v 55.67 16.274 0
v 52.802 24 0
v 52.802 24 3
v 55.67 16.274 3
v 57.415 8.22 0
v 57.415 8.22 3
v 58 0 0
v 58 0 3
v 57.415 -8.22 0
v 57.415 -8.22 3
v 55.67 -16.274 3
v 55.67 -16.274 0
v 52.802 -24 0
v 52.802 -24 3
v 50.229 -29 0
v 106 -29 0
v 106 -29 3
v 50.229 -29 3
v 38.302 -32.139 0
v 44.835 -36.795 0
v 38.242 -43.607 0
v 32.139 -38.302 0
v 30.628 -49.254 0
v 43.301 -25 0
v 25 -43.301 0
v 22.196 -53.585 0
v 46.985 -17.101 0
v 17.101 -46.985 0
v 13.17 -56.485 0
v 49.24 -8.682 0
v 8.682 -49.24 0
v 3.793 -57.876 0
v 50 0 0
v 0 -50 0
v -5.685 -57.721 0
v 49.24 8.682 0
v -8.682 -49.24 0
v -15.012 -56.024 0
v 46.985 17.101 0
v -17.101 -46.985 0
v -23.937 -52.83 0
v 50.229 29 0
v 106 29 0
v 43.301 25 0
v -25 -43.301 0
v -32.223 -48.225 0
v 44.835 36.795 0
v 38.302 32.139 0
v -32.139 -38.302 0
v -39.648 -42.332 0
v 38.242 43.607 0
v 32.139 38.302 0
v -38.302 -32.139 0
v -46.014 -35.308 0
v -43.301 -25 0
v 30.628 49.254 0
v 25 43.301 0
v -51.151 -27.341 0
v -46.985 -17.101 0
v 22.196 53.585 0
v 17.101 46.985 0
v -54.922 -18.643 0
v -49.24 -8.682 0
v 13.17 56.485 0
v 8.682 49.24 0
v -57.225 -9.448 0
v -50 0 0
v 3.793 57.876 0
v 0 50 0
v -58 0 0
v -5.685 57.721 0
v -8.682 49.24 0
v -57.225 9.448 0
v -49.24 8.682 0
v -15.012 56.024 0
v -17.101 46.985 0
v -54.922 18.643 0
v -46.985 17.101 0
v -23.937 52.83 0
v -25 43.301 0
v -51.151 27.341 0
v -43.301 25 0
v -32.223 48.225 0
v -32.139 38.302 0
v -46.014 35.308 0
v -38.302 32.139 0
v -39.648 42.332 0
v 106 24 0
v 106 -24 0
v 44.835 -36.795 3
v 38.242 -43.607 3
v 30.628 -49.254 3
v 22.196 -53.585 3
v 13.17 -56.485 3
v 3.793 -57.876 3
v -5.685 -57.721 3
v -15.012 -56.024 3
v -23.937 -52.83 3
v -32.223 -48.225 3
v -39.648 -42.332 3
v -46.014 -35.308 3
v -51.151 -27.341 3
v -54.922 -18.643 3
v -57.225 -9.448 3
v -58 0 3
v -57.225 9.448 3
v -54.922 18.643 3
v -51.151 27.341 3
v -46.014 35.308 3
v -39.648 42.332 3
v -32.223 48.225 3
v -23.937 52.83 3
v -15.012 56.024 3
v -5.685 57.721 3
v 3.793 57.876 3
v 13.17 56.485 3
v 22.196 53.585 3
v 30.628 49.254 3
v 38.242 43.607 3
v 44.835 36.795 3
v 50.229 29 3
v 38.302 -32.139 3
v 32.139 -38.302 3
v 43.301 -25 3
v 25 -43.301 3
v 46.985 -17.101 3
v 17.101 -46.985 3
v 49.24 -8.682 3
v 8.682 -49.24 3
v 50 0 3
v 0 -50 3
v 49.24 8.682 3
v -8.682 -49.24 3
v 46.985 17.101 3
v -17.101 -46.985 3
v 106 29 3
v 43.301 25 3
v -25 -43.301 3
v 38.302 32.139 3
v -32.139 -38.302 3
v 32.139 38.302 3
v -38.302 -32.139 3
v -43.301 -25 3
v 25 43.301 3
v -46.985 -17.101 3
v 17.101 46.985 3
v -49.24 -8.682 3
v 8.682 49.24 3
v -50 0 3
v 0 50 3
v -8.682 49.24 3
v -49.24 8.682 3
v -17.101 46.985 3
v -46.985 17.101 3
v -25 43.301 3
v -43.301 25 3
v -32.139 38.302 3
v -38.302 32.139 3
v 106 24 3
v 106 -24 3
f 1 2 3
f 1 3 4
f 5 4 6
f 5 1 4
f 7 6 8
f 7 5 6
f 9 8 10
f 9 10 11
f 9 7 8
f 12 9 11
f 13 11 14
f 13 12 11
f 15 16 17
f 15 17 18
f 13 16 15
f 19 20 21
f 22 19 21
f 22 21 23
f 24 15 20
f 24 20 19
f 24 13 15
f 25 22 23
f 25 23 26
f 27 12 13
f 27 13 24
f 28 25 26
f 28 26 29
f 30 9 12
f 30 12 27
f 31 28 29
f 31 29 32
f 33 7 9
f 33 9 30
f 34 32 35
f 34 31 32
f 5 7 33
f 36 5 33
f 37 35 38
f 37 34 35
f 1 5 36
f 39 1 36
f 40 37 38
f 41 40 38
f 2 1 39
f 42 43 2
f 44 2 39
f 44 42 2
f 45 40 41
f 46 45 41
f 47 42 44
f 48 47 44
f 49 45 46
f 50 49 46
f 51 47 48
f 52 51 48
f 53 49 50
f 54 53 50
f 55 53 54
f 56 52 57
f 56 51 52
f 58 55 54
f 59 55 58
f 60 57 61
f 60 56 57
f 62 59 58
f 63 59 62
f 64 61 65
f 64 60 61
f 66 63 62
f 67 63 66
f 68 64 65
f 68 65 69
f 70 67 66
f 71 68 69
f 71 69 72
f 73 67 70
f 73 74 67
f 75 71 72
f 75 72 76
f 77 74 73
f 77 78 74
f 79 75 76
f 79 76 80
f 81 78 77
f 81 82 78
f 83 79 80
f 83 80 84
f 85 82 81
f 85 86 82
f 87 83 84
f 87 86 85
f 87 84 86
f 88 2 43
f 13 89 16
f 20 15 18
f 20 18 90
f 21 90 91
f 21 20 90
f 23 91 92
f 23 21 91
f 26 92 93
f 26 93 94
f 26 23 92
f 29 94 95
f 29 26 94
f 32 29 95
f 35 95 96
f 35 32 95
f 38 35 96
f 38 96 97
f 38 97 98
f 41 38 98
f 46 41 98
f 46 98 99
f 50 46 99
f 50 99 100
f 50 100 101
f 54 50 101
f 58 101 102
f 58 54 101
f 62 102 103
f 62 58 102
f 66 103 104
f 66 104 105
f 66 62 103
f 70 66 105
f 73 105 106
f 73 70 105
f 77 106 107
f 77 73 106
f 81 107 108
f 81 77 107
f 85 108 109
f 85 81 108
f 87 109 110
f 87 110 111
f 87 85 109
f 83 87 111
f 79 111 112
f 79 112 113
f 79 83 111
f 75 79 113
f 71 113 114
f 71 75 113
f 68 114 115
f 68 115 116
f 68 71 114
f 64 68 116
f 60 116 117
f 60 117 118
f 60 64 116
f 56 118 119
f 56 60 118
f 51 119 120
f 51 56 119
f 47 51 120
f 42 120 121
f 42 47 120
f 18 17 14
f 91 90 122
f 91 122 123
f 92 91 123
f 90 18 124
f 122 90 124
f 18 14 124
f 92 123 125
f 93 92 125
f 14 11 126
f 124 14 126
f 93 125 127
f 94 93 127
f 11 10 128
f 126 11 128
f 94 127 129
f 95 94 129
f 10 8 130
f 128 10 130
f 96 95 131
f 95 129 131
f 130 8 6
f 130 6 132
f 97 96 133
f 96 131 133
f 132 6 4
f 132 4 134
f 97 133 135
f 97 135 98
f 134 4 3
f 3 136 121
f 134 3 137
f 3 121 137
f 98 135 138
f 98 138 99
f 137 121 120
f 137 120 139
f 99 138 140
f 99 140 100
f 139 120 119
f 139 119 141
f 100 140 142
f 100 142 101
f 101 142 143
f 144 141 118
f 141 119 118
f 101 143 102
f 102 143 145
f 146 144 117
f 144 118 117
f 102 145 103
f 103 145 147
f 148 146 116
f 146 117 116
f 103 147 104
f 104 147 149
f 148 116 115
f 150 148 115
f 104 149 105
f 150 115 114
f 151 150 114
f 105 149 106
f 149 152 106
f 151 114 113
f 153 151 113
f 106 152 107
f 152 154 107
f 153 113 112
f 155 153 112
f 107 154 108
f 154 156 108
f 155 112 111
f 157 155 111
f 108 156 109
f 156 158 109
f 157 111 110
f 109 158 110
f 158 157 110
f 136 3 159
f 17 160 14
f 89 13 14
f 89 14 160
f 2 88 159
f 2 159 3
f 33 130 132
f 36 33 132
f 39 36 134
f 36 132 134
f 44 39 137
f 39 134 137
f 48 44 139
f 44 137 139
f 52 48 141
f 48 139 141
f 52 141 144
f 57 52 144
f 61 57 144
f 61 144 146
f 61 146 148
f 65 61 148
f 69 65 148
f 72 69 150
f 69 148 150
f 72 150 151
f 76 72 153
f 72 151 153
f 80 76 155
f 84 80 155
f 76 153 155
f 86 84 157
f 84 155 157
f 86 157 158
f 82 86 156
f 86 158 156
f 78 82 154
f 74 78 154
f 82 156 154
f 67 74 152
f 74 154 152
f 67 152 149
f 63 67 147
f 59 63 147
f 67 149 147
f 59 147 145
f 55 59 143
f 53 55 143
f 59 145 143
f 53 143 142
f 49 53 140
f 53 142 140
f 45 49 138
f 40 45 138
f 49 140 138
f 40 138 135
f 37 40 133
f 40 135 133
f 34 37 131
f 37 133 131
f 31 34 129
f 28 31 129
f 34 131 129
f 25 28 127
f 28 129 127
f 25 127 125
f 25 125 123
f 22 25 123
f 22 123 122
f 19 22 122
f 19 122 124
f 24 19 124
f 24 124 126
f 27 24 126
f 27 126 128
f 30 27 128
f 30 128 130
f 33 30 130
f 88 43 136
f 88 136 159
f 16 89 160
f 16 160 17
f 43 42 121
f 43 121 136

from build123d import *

# Parameters (mm, degrees)
EXTRUDE_1_DEPTH     = 3
SKETCH_5_R          = 50
CUT_EXTRUDE_1_DEPTH = 3


with BuildPart() as part:
    # 草圖1 → 填料-伸長1 (new body)
    with BuildSketch(Plane.XY):
        with BuildLine():
            Line((106, 24), (52.80151513, 24))
            ThreePointArc((52.80151513, 24), (58, 0), (52.80151513, -24))
            Line((52.80151513, -24), (106, -24))
            Line((106, -24), (106, -29))
            Line((106, -29), (50.229473419, -29))
            ThreePointArc((50.229473419, -29), (-58, 0), (50.229473419, 29))
            Line((50.229473419, 29), (106, 29))
            Line((106, 29), (106, 24))
        make_face()
    extrude(amount=EXTRUDE_1_DEPTH)

    # 草圖5 → 除料-伸長1 (cut)
    with BuildSketch(Plane.XY.offset(3)):
        Circle(SKETCH_5_R)
    extrude(amount=-CUT_EXTRUDE_1_DEPTH, mode=Mode.SUBTRACT)


solid = part.part
